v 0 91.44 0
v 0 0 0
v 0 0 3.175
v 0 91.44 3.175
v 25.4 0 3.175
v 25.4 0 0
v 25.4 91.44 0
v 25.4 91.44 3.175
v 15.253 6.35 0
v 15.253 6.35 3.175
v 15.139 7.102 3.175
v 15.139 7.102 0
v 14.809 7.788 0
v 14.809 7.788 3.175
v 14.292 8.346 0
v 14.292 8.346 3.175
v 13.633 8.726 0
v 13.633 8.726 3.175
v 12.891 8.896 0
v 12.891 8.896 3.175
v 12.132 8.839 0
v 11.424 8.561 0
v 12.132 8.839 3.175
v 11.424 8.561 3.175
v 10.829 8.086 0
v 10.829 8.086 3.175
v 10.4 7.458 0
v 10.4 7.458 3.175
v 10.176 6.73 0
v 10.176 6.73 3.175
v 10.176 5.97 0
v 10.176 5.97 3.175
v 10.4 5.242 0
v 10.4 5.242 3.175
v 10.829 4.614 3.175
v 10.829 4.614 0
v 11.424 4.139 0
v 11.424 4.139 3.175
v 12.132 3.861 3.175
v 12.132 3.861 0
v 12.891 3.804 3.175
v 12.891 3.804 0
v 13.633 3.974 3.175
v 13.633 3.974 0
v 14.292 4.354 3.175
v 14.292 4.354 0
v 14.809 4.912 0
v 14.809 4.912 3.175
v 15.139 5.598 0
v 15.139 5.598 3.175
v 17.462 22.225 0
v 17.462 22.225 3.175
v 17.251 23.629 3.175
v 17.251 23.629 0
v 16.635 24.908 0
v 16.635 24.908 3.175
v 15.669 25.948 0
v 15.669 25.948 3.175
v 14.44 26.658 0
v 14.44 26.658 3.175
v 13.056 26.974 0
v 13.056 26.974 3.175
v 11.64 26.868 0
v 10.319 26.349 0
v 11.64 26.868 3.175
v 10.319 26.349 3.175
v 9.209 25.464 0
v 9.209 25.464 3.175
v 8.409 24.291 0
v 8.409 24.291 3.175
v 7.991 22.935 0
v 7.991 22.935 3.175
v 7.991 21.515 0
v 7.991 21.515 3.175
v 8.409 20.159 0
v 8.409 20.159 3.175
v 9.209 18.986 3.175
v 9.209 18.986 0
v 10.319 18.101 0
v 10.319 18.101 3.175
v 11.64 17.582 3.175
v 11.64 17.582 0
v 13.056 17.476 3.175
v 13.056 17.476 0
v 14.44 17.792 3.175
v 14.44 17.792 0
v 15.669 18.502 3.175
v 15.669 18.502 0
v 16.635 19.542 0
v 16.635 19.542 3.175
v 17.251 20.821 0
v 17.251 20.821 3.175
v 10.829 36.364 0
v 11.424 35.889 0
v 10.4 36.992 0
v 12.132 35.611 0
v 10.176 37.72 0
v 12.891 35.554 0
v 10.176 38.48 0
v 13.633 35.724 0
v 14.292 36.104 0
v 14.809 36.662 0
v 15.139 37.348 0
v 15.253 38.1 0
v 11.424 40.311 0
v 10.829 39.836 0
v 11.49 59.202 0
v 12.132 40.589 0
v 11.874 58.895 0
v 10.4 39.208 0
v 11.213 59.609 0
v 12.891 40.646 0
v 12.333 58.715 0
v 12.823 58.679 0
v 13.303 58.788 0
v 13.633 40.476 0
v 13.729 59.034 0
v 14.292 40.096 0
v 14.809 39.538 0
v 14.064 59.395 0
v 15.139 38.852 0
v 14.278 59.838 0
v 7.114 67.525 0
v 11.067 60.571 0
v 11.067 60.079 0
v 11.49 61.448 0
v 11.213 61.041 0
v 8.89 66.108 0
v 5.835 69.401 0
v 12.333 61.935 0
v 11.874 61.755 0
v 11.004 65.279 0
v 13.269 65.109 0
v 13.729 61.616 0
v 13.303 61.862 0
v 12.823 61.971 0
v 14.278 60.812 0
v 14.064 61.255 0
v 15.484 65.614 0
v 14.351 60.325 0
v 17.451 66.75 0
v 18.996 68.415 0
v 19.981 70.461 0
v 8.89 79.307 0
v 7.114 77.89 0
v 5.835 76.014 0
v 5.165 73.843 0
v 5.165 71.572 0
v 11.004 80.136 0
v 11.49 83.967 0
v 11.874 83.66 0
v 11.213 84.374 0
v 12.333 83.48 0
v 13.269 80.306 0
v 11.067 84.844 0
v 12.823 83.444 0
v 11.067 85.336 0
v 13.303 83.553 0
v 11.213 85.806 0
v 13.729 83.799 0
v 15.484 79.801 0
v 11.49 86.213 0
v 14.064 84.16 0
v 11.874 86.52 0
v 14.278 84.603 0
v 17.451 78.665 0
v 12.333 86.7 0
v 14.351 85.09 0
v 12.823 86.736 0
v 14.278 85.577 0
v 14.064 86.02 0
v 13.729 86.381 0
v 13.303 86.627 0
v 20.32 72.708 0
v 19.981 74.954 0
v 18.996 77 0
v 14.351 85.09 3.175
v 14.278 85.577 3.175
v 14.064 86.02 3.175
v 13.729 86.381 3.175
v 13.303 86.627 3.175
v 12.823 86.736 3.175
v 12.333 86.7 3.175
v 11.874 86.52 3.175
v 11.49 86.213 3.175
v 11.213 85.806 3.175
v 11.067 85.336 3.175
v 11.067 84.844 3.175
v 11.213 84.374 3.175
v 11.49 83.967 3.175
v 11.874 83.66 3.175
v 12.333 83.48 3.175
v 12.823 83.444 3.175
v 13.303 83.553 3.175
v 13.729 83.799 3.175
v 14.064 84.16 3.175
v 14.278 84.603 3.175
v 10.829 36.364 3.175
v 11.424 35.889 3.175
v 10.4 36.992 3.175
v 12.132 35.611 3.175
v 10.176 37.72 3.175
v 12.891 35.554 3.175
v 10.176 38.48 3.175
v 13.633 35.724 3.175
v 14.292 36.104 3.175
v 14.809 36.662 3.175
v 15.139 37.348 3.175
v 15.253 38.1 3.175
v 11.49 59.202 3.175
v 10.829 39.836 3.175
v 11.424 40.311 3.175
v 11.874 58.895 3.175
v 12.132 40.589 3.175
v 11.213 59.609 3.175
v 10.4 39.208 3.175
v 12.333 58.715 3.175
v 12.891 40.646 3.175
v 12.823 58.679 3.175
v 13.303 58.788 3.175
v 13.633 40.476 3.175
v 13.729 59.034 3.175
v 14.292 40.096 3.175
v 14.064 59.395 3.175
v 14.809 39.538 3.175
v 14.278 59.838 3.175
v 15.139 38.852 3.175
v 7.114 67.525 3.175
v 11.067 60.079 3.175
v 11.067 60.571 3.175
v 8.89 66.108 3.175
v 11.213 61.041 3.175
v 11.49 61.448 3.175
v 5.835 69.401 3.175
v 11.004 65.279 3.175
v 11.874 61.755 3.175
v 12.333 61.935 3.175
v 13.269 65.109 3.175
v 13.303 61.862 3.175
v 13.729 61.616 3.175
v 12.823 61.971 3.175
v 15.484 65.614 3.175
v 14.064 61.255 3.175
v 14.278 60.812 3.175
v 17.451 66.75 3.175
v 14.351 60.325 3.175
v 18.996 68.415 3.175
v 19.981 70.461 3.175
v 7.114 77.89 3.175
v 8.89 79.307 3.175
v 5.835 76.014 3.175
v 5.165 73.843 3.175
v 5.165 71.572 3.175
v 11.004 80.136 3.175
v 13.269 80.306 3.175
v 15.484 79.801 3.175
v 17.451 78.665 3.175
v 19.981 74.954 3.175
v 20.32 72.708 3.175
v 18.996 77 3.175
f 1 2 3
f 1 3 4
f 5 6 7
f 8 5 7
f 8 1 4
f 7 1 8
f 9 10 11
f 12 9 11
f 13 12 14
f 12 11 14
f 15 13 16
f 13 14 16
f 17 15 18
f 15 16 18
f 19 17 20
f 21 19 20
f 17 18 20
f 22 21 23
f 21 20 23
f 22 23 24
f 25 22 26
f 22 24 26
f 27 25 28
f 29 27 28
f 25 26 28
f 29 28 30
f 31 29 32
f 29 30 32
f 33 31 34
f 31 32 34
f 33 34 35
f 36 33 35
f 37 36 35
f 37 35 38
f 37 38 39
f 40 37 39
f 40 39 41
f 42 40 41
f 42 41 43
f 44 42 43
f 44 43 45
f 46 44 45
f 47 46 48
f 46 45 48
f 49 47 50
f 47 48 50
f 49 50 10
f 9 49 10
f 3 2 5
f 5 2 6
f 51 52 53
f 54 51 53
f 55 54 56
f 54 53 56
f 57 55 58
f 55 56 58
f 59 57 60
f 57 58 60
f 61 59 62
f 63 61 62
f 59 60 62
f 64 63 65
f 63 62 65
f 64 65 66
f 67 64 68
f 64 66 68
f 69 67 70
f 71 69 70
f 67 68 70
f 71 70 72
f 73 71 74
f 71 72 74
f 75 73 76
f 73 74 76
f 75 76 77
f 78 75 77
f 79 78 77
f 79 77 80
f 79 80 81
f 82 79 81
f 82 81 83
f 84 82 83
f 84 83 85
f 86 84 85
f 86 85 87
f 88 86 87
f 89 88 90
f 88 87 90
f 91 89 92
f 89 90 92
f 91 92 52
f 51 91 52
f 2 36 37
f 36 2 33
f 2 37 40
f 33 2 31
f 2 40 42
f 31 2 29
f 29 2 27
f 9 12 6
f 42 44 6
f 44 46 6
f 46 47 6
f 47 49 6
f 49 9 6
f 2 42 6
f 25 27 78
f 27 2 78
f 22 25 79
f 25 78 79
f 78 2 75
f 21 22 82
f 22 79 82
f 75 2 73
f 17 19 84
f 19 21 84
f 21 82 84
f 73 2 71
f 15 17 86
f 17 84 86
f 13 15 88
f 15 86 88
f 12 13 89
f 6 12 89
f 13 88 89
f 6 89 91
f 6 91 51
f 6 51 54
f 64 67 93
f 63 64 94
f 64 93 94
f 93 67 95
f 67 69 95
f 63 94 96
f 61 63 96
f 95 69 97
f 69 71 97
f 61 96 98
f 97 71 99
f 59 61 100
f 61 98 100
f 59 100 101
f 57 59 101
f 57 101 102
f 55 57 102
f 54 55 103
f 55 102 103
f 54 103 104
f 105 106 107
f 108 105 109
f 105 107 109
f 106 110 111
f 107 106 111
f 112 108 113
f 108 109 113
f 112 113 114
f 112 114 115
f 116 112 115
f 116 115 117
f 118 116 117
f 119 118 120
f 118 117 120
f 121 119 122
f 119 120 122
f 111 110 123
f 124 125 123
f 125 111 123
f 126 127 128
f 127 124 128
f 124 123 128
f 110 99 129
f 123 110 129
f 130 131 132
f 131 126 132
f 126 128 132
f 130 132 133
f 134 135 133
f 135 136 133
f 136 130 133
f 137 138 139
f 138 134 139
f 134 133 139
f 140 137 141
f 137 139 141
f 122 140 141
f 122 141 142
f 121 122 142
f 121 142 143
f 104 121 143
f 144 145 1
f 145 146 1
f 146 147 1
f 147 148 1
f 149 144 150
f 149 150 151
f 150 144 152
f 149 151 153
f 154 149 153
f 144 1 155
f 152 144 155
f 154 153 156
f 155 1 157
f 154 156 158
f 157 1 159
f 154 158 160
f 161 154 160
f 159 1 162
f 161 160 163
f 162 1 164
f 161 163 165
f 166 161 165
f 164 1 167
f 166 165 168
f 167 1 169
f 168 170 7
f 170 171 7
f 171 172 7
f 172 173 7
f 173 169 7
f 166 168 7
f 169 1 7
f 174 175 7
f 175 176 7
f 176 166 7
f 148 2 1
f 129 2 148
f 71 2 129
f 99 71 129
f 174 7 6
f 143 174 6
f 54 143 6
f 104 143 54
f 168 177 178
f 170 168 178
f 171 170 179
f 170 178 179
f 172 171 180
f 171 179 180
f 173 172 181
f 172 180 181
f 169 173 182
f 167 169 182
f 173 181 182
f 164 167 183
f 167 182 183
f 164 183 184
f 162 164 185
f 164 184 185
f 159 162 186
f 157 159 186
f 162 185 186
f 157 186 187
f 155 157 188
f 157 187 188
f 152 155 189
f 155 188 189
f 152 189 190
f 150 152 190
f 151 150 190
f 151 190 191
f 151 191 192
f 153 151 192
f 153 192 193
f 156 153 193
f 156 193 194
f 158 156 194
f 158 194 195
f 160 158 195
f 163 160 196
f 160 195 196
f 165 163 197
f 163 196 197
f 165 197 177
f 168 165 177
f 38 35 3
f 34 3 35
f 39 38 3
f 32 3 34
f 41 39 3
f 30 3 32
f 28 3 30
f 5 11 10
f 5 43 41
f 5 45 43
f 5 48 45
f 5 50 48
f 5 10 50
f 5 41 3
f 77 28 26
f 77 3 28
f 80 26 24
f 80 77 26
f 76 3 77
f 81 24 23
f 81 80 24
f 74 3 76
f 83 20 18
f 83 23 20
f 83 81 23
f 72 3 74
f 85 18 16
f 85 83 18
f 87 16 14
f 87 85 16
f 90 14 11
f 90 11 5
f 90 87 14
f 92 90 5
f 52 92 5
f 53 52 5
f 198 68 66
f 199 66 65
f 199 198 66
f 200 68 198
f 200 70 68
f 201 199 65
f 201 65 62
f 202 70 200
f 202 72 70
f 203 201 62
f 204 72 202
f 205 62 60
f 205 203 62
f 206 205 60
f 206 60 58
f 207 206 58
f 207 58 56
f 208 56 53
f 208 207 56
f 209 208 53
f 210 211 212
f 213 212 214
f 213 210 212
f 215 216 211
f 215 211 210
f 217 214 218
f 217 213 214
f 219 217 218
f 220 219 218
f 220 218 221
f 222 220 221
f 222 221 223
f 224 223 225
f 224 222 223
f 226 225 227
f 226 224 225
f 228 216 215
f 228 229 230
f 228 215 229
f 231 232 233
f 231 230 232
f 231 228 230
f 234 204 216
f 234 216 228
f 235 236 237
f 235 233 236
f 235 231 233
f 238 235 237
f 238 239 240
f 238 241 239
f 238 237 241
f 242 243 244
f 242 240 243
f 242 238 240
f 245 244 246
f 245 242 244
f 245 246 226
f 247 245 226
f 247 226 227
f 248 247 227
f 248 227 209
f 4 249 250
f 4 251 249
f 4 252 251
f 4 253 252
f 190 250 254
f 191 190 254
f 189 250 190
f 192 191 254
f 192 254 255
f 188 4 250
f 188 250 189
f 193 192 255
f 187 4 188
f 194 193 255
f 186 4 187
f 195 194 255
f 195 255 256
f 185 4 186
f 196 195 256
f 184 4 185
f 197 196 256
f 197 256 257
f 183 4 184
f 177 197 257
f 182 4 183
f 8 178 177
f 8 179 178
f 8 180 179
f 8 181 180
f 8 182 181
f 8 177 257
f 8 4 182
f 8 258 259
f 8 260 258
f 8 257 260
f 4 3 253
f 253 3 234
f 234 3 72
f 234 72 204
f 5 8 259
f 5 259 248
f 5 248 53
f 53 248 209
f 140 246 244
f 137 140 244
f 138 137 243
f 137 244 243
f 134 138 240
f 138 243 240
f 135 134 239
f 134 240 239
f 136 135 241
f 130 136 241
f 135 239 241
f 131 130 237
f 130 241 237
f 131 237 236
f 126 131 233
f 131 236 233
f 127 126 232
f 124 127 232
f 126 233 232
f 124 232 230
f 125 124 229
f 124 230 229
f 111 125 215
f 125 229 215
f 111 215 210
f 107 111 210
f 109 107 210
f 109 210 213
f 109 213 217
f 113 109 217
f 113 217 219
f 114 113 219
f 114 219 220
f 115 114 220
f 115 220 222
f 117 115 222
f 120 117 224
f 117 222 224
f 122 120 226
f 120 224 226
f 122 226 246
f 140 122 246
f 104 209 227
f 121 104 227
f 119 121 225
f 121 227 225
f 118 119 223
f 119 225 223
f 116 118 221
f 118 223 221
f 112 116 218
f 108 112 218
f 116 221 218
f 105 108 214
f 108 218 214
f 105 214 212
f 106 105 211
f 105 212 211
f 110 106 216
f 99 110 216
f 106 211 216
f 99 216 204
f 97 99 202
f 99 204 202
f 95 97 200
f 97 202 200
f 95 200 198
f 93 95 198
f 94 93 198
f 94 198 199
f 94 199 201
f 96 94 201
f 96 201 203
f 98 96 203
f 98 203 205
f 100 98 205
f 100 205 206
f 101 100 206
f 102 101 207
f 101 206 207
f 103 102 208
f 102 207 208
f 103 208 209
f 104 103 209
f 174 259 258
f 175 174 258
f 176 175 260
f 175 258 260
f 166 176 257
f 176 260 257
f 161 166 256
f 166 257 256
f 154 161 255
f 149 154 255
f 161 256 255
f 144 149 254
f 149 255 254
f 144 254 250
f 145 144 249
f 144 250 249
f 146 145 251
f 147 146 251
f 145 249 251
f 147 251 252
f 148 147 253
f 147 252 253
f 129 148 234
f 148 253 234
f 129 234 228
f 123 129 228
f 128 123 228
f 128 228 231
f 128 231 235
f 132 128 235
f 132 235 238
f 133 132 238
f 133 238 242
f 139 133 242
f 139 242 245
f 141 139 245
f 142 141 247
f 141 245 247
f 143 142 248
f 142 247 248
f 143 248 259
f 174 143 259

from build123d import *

# Parameters (mm, degrees)
SKETCH1_W           = 25.4
SKETCH1_H           = 91.44
BOSS_EXTRUDE1_DEPTH = 3.175
SKETCH2_R           = 2.5527
SKETCH2_R_2         = 4.7625
CUT_EXTRUDE1_DEPTH  = 3.175
SKETCH3_R           = 1.651
SKETCH3_R_2         = 7.62
CUT_EXTRUDE2_DEPTH  = 3.175


with BuildPart() as part:
    # Sketch1 → Boss-Extrude1 (new body)
    with BuildSketch(Plane.XY):
        with Locations((12.7, 45.72)):
            Rectangle(SKETCH1_W, SKETCH1_H)
    extrude(amount=BOSS_EXTRUDE1_DEPTH)

    # Sketch2 → Cut-Extrude1 (cut)
    with BuildSketch(Plane.XY.offset(3.175)):
        with Locations((12.7, 6.35)):
            Circle(SKETCH2_R)
        with Locations((12.7, 38.1)):
            Circle(SKETCH2_R)
        with Locations((12.7, 22.225)):
            Circle(SKETCH2_R_2)
    extrude(amount=-CUT_EXTRUDE1_DEPTH, mode=Mode.SUBTRACT)

    # Sketch3 → Cut-Extrude2 (cut)
    with BuildSketch(Plane.XY.offset(3.175)):
        with Locations((12.7, 85.09)):
            Circle(SKETCH3_R)
        with Locations((12.7, 60.325)):
            Circle(SKETCH3_R)
        with Locations((12.7, 72.7075)):
            Circle(SKETCH3_R_2)
    extrude(amount=-CUT_EXTRUDE2_DEPTH, mode=Mode.SUBTRACT)


solid = part.part
